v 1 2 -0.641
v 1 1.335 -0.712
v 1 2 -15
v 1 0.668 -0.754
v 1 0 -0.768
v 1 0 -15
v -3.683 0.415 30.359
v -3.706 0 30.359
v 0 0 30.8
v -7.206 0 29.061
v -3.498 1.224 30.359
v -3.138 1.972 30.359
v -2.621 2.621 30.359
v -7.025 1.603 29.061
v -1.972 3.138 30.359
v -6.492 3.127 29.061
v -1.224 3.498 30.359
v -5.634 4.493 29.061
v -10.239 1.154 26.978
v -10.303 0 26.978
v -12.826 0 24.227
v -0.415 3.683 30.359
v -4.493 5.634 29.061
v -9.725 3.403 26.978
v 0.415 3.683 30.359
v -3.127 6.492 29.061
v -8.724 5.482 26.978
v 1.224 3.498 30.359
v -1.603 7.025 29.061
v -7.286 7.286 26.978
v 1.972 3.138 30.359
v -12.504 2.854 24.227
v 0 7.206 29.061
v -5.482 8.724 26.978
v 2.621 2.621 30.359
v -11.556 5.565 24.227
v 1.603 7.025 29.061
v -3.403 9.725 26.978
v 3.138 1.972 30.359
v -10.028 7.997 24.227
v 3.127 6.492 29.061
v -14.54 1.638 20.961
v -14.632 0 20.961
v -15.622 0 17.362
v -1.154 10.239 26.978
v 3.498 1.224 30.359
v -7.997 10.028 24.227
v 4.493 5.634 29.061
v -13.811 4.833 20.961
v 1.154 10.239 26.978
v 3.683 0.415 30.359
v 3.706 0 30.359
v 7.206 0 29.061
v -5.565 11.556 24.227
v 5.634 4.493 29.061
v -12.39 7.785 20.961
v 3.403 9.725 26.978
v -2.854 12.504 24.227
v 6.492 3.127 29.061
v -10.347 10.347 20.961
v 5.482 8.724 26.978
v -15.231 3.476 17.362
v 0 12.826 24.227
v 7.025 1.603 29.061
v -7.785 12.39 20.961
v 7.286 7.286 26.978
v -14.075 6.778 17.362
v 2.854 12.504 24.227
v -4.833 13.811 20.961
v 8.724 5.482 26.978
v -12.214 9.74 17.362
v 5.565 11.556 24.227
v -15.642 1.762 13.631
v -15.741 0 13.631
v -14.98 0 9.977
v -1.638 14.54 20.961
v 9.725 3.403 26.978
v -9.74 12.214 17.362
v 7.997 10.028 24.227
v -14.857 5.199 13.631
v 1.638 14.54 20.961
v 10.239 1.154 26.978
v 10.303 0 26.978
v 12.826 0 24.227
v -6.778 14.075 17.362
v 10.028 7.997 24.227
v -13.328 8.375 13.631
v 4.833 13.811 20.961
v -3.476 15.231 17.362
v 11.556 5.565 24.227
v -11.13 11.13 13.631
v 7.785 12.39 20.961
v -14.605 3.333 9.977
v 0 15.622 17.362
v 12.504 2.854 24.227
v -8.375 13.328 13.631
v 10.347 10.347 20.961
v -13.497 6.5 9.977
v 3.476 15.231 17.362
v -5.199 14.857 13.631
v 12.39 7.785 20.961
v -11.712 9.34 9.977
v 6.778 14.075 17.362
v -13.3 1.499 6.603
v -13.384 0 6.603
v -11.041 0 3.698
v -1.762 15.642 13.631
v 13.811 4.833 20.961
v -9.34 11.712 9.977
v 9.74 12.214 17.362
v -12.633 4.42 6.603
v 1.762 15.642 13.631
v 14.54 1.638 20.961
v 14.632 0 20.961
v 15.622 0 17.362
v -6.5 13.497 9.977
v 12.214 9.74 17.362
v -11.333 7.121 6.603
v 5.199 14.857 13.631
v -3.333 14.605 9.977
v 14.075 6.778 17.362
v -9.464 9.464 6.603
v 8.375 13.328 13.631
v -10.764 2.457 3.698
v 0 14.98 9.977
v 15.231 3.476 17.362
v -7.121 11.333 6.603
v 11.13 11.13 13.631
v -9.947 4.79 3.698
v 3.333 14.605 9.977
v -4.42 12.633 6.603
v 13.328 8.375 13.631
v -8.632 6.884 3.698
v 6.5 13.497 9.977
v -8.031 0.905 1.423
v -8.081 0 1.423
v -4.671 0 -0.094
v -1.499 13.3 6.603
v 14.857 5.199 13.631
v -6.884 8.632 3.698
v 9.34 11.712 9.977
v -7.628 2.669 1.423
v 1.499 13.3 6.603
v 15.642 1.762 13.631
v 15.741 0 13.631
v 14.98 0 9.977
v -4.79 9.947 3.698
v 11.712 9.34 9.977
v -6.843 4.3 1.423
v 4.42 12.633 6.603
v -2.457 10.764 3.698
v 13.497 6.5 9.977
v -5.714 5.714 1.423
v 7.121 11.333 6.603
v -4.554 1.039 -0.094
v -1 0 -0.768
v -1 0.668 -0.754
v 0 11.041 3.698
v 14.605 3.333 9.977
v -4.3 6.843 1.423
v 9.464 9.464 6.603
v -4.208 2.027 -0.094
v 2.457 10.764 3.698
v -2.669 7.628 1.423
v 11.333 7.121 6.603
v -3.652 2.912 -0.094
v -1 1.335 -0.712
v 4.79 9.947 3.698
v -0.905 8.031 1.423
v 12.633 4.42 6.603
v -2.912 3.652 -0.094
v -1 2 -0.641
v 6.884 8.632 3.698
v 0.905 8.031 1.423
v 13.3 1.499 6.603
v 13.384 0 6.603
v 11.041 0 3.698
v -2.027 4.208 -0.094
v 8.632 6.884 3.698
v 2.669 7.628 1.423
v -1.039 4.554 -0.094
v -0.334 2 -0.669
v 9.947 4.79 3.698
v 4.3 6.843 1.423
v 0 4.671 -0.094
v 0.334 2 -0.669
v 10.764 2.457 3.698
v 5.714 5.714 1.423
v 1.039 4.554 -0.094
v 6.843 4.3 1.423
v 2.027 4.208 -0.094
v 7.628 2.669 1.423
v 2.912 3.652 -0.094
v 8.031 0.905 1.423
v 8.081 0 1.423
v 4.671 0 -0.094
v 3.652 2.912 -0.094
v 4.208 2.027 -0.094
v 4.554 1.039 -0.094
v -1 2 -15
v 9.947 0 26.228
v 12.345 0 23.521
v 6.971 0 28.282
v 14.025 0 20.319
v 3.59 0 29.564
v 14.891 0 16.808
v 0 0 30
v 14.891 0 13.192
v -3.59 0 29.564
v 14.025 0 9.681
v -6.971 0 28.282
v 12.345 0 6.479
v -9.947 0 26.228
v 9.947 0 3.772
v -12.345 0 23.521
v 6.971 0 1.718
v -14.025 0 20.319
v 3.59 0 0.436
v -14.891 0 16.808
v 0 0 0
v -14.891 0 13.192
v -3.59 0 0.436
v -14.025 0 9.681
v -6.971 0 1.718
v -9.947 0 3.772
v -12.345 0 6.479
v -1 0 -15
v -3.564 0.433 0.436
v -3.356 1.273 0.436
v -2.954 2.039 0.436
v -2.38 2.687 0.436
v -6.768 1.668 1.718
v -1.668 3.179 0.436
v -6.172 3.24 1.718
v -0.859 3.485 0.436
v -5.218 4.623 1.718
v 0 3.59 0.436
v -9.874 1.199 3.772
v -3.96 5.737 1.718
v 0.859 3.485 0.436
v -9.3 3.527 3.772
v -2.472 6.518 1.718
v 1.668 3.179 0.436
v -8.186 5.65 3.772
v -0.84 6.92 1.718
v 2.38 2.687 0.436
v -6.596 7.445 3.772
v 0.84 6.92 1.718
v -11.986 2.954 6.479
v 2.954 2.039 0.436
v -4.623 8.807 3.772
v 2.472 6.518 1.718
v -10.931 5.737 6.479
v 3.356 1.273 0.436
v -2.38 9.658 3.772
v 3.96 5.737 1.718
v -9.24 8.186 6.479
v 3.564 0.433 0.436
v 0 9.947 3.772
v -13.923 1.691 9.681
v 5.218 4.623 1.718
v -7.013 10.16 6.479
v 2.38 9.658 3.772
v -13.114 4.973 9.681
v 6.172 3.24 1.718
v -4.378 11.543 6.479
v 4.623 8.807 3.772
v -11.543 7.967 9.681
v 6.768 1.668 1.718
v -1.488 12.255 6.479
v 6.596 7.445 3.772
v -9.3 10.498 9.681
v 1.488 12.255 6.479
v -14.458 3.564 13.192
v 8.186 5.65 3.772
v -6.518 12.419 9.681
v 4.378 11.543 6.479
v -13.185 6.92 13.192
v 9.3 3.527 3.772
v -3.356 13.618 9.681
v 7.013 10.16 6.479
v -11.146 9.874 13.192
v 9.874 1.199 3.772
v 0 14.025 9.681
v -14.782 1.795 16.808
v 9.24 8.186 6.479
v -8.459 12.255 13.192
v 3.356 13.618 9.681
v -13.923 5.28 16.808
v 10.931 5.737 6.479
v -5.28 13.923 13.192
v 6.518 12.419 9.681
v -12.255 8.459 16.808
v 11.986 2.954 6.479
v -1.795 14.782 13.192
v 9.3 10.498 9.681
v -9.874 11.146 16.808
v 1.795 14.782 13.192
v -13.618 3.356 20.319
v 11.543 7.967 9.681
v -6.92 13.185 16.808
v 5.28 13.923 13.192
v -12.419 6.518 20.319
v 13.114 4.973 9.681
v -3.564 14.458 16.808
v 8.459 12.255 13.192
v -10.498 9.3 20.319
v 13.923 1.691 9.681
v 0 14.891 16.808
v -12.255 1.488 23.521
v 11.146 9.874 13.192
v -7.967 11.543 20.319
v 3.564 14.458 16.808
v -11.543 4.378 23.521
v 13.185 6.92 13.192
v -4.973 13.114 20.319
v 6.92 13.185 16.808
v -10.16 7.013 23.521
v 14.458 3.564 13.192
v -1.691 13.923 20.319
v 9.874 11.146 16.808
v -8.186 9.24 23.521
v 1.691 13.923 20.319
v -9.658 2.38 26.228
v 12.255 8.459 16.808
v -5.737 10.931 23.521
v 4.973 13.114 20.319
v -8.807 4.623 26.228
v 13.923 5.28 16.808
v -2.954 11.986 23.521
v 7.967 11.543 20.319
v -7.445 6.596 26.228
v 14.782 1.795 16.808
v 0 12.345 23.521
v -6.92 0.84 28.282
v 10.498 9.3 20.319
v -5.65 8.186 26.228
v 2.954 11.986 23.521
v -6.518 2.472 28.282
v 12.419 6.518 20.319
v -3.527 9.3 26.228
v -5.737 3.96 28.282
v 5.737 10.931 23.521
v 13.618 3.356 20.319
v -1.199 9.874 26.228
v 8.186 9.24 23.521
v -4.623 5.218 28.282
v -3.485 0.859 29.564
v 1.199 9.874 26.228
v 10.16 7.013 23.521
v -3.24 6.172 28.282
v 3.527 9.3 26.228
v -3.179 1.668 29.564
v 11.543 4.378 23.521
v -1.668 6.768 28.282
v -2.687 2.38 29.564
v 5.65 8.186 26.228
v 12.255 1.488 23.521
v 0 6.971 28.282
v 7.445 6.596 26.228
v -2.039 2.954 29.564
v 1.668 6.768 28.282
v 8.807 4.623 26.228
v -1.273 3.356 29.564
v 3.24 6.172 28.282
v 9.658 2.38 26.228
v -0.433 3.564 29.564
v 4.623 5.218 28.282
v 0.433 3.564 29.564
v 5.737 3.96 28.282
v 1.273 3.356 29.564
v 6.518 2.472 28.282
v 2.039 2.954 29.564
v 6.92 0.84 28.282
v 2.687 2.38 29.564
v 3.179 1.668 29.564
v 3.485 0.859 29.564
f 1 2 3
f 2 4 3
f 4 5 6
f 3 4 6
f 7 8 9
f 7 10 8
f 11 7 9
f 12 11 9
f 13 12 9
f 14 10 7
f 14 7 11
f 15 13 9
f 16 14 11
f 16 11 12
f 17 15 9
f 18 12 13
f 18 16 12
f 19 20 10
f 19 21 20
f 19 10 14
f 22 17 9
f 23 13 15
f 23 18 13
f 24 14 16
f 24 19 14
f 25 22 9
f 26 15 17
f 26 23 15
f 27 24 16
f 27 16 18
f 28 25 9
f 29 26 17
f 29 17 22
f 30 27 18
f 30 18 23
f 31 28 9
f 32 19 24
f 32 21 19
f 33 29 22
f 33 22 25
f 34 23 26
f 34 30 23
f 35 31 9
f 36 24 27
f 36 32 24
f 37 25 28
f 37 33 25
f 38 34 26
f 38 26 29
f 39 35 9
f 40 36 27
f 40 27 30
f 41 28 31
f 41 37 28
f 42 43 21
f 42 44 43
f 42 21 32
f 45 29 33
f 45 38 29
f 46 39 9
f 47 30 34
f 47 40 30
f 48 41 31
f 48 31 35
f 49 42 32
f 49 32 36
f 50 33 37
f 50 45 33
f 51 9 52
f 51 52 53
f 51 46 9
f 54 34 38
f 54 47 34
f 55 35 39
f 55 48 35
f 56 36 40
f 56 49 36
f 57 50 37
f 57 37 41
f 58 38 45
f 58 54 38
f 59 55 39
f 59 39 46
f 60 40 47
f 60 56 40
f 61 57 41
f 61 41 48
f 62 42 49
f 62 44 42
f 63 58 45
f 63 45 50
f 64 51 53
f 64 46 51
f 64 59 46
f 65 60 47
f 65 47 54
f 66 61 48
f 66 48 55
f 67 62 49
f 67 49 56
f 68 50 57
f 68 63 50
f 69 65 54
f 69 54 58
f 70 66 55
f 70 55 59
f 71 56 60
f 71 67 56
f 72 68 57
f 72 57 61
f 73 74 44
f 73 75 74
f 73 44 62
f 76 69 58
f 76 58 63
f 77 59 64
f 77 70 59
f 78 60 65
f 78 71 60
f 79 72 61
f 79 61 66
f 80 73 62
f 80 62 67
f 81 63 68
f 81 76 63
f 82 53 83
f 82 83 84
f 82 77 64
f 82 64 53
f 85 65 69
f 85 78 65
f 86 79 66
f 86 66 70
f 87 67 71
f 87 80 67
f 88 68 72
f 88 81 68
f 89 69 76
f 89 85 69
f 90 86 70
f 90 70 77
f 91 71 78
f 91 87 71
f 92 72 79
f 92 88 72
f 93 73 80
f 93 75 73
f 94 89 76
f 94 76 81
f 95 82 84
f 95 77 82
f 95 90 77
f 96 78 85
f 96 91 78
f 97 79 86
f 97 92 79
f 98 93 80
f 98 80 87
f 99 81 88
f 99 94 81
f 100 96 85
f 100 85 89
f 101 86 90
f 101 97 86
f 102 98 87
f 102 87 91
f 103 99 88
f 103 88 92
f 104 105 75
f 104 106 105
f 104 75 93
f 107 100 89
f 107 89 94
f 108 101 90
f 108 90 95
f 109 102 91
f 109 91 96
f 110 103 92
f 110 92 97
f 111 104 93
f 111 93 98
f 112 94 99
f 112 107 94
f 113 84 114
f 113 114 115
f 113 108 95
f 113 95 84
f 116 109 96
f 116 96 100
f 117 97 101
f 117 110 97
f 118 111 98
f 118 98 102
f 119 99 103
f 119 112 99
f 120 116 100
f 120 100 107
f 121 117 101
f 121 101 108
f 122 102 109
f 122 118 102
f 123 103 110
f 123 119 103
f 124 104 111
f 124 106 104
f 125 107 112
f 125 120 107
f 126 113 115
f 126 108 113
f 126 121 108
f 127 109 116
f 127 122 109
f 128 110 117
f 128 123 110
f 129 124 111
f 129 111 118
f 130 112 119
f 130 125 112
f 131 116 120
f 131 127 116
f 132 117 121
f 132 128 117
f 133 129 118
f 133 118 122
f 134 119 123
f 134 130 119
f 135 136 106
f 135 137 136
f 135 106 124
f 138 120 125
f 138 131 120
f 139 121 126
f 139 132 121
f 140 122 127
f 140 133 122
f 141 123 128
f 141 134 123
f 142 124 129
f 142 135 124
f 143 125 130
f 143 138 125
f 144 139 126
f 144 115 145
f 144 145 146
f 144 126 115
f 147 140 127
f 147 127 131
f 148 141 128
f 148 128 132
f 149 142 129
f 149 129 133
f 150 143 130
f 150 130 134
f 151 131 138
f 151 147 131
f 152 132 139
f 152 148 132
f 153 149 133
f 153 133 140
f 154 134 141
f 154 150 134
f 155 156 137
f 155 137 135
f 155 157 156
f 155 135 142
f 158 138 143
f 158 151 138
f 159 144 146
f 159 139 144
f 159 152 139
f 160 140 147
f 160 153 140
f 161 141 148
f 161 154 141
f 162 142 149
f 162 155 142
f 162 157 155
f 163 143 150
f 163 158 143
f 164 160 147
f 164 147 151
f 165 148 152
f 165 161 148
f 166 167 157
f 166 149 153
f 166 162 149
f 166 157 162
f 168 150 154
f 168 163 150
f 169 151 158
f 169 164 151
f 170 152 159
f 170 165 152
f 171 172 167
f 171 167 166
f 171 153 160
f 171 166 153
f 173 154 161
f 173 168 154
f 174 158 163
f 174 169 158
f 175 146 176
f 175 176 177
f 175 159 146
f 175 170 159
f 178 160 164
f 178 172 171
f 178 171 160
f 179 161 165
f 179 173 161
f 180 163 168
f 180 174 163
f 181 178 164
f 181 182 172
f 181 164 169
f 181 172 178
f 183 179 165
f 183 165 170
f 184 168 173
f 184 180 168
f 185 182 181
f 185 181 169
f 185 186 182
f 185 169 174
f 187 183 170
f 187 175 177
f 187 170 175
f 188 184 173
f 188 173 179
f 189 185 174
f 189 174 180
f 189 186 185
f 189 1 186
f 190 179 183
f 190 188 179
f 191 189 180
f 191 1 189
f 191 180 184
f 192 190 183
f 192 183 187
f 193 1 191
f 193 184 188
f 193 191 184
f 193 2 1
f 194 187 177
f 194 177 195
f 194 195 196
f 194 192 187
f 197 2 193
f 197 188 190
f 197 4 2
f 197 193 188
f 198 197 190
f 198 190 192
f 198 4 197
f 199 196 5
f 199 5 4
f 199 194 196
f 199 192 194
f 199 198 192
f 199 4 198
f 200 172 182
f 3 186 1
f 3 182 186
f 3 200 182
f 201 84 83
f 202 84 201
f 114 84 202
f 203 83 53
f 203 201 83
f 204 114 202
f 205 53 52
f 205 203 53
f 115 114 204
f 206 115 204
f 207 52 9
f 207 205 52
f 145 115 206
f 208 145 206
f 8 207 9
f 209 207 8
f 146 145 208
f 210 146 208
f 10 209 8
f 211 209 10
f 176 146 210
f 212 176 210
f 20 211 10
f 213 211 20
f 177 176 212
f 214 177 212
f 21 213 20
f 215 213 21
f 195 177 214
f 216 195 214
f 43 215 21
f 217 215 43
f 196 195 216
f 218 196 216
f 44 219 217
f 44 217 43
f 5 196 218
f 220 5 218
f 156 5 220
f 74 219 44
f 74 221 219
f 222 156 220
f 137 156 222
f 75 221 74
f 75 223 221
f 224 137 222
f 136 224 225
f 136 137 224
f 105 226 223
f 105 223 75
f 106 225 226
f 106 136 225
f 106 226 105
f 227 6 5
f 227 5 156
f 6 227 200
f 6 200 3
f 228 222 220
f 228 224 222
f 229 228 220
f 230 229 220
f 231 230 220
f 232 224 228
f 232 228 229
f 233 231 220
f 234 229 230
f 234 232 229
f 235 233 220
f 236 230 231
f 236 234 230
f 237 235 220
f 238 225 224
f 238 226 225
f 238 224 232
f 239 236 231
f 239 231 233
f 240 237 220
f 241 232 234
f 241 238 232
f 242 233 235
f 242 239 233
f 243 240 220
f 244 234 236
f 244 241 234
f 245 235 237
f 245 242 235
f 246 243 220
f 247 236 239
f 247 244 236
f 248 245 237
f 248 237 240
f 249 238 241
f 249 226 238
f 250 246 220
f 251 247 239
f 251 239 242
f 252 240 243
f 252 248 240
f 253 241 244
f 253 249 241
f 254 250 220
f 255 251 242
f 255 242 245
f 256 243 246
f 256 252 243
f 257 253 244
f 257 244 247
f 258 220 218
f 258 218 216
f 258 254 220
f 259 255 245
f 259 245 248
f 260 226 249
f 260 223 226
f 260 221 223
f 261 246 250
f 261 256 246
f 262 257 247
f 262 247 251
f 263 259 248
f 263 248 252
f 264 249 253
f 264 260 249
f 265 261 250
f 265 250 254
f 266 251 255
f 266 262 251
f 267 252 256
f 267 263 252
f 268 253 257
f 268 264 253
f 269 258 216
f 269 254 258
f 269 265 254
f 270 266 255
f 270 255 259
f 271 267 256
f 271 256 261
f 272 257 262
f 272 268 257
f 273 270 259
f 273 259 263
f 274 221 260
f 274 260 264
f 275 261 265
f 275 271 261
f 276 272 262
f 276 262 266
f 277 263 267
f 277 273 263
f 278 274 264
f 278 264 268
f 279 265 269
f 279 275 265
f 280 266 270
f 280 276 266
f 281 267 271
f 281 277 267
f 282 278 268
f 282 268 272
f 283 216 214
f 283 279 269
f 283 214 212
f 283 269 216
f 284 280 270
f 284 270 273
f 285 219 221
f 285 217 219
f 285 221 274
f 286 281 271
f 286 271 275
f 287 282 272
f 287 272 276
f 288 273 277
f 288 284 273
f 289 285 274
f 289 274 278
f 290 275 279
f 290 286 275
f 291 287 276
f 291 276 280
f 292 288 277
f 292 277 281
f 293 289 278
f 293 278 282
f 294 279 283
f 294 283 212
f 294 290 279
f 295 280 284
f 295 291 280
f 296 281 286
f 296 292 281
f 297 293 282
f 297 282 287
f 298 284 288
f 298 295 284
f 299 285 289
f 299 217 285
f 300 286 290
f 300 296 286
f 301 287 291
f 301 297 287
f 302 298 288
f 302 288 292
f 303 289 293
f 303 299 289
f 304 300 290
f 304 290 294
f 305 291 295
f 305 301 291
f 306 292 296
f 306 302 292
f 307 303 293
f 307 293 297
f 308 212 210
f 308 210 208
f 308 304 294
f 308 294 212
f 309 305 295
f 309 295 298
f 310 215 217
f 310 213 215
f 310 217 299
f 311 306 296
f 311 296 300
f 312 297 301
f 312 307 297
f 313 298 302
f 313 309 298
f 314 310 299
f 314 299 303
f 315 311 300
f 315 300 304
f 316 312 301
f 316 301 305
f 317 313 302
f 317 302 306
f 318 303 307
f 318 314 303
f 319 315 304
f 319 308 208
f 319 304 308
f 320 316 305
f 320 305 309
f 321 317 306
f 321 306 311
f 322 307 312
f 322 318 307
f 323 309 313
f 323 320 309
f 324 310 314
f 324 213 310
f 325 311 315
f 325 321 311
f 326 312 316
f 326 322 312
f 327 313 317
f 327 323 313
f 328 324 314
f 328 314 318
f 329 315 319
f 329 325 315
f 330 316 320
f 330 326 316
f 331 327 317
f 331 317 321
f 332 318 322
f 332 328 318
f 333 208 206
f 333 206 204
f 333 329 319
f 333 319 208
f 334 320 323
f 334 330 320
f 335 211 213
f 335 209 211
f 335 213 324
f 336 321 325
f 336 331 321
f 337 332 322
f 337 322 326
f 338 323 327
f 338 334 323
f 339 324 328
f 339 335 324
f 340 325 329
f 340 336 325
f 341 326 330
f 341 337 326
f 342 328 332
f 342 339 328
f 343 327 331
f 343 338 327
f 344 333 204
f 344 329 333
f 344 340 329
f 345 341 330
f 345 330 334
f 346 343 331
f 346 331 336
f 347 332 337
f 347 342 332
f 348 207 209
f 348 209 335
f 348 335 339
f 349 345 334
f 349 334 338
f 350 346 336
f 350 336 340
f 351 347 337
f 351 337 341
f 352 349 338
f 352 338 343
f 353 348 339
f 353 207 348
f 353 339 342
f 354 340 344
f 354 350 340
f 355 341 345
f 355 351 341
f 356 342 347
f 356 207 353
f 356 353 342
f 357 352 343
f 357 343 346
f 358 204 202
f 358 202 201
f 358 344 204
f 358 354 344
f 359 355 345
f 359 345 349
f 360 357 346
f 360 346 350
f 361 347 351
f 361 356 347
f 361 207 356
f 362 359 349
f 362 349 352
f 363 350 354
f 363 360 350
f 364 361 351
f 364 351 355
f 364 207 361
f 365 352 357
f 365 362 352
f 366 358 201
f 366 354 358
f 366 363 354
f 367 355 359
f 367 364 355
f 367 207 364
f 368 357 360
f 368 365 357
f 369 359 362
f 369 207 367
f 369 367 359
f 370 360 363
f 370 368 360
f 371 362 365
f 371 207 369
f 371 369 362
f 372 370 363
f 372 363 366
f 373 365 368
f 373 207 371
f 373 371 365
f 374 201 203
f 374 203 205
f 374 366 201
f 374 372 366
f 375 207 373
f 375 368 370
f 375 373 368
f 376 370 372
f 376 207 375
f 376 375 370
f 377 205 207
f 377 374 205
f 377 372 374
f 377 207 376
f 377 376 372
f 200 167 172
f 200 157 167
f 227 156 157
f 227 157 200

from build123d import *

# Parameters (mm, degrees)
SKETCH_1_W      = 2
SKETCH_1_H      = 15
EXTRUDE_1_DEPTH = 2
REVOLVE_1_ANGLE = 180


with BuildPart() as part:
    # Эскиз1 → Бобышка-Вытянуть1 (new body)
    with BuildSketch(Plane(origin=(0, 0, 0), x_dir=(1, 0, 0), z_dir=(0, 1, 0))):
        with Locations((0, 7.5)):
            Rectangle(SKETCH_1_W, SKETCH_1_H)
    extrude(amount=EXTRUDE_1_DEPTH)

    # Эскиз2 → Повернуть1 (revolve)
    with BuildSketch(Plane(origin=(0, 0, 0), x_dir=(1, 0, 0), z_dir=(0, 1, 0))):
        with BuildLine():
            Line((0, 0.8), (0, 0))
            ThreePointArc((0, 0), (-15, -15), (0, -30))
            Line((0, -30), (0, -30.8))
            ThreePointArc((0, -30.8), (-15.8, -15), (0, 0.8))
        make_face()
    revolve(axis=Axis((0, 0, 15), (0, 0, -1)), revolution_arc=REVOLVE_1_ANGLE)


solid = part.part
